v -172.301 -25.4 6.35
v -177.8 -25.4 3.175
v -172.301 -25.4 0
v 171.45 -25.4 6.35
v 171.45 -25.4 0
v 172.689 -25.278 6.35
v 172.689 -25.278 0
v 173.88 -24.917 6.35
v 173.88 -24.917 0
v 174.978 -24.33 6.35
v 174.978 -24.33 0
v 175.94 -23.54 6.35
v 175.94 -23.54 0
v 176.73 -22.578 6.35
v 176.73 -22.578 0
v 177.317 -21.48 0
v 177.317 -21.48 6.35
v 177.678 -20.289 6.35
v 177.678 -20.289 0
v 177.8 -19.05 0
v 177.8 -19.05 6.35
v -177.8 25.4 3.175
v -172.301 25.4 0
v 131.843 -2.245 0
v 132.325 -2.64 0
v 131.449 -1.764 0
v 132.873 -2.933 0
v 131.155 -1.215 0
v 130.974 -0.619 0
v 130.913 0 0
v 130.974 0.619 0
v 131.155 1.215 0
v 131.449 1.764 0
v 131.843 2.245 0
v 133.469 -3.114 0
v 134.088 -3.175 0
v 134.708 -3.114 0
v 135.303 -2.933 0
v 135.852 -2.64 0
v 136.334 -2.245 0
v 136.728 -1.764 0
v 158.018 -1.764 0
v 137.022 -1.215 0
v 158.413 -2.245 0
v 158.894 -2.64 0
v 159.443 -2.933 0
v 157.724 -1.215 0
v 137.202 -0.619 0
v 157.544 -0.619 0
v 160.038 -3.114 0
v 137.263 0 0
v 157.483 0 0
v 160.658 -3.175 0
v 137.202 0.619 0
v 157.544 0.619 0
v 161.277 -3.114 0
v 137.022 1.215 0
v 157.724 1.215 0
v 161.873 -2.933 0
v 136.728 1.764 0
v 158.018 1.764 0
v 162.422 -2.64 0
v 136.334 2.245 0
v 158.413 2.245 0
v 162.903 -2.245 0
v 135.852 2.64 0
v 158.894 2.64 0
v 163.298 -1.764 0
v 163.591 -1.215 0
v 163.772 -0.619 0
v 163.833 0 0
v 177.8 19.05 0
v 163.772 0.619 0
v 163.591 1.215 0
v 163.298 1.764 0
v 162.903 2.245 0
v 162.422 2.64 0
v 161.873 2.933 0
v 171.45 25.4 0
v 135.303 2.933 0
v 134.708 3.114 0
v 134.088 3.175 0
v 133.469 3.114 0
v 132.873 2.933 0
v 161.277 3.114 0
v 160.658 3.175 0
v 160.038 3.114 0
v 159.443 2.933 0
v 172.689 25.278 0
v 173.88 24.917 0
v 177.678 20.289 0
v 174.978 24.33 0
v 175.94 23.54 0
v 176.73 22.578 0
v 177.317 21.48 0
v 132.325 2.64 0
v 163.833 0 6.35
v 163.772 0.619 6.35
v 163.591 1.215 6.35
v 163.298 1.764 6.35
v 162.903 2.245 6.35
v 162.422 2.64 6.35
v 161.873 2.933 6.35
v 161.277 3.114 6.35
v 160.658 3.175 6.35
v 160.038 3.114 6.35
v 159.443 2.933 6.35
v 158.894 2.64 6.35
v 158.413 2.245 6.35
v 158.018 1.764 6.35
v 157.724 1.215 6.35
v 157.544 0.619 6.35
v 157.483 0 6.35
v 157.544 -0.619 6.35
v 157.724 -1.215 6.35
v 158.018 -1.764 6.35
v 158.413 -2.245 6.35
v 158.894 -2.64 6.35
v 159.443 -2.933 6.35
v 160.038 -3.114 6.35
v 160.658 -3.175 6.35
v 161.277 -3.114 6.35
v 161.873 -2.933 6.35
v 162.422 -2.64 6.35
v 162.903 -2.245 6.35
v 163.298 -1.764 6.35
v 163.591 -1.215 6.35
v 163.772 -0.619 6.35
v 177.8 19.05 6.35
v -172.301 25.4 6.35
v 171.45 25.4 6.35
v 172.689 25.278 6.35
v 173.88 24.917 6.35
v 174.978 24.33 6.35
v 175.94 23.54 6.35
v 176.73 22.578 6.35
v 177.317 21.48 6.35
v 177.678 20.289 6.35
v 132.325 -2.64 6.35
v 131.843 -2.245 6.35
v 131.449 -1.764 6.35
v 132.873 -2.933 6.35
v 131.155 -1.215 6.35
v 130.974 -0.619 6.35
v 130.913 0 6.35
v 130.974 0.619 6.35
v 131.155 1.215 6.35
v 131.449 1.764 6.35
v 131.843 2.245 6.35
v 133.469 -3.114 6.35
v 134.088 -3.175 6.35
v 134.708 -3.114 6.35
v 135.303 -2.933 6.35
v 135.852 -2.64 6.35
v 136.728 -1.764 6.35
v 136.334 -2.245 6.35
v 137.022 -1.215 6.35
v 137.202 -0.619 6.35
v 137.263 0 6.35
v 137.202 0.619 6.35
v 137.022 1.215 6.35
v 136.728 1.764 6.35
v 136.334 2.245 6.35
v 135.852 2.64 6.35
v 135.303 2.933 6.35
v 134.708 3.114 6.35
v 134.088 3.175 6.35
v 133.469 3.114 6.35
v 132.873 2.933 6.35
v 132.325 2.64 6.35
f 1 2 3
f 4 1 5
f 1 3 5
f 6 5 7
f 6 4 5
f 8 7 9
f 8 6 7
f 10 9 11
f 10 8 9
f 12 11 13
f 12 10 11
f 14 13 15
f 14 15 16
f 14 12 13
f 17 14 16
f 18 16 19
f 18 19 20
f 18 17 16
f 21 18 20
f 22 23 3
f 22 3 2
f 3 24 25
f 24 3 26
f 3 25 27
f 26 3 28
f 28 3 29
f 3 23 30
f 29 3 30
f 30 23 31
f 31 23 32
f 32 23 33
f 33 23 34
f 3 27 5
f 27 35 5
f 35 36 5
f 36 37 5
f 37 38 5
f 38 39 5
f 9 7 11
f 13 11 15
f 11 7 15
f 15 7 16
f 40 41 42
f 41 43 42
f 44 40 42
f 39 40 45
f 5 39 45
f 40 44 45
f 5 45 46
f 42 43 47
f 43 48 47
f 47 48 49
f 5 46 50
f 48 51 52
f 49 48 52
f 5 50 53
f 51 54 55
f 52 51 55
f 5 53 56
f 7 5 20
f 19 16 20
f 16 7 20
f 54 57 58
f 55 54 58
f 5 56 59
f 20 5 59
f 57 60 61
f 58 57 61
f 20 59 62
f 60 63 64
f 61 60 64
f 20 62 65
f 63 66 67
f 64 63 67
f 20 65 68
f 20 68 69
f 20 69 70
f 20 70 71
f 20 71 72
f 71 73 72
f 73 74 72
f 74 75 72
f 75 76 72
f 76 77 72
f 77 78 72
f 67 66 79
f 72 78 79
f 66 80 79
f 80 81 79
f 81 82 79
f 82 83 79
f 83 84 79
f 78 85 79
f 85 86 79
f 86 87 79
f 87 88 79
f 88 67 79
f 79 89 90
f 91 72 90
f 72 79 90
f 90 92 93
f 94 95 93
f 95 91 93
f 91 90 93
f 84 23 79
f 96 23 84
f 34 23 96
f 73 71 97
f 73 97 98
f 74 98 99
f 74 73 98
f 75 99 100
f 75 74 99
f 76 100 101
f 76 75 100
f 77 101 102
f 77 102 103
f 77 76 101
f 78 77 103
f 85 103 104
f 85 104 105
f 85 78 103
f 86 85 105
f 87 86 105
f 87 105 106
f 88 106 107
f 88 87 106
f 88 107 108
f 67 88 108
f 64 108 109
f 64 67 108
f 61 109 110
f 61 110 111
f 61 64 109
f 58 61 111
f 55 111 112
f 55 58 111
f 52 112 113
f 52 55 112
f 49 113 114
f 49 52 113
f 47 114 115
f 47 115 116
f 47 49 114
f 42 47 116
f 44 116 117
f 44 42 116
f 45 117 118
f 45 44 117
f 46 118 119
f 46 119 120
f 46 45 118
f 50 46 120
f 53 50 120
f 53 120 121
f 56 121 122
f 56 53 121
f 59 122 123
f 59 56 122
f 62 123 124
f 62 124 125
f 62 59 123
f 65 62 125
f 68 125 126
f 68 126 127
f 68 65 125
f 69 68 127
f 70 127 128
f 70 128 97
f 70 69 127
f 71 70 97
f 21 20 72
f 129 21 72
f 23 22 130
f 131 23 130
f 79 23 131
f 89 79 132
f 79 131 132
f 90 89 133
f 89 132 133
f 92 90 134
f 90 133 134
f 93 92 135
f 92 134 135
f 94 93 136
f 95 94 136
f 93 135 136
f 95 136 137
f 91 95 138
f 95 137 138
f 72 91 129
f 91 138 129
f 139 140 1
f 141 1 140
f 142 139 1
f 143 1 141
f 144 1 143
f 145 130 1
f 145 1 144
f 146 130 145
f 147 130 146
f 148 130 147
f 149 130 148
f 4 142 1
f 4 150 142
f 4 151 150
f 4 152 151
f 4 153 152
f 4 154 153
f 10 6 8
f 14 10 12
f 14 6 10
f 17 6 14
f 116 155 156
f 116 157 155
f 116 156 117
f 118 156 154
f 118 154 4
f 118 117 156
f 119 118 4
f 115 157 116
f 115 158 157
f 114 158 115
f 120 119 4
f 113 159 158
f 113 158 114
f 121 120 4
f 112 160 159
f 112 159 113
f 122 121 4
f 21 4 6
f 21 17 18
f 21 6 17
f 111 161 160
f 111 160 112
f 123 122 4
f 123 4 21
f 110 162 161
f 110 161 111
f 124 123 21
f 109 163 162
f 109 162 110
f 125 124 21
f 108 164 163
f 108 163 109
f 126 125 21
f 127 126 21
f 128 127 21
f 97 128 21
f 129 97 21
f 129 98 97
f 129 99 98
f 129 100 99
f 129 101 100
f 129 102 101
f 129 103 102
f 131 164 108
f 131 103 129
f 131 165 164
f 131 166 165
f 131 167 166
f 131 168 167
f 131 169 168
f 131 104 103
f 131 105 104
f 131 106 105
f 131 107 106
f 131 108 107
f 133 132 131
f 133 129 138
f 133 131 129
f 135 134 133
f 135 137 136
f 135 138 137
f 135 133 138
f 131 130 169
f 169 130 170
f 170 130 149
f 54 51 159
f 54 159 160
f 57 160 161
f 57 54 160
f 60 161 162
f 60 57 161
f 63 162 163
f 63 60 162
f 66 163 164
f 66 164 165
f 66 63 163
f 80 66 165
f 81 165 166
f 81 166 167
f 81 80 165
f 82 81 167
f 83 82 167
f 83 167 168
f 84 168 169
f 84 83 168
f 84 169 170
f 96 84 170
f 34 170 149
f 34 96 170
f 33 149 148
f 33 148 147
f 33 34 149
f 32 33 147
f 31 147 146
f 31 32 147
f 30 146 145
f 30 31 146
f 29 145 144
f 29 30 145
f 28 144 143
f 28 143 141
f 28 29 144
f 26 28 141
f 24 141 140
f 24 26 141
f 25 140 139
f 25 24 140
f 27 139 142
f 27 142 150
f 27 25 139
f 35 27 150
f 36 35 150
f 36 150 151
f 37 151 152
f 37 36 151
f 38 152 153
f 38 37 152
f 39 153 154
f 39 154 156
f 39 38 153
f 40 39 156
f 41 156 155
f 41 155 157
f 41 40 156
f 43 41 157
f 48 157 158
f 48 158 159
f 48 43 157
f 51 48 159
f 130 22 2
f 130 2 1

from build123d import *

# Parameters (mm, degrees)
F0_W     = 355.6
F0_H     = 50.8
F0_R     = 3.175
F1_DEPTH = 6.35
F2_R     = 6.35
F4_DEPTH = 50.801


with BuildPart() as f1:
    # F0 (on Top) → F1 (new body)
    with BuildSketch(Plane.XY):
        Rectangle(F0_W, F0_H)
        with Locations((134.088472, 0)):
            Circle(F0_R, mode=Mode.SUBTRACT)
        with Locations((160.657585, 0)):
            Circle(F0_R, mode=Mode.SUBTRACT)
    extrude(amount=F1_DEPTH)

    # F2
    f2_edges = [f1.edges().sort_by_distance(p)[0] for p in [
        (177.8, -25.4, 3.175),
        (177.8, 25.4, 3.175),
    ]]
    fillet(f2_edges, radius=F2_R)

    # F3 (on face) → F4 (cut, through all)
    with BuildSketch(Plane.XZ.offset(25.4)):
        Polygon((-177.8, 6.35), (-177.8, 3.175), (-172.300739, 6.35), align=None)
        Polygon((-172.300739, 0), (-177.8, 3.175), (-177.8, 0), align=None)
    extrude(amount=-F4_DEPTH, mode=Mode.SUBTRACT)


solid = f1.part
